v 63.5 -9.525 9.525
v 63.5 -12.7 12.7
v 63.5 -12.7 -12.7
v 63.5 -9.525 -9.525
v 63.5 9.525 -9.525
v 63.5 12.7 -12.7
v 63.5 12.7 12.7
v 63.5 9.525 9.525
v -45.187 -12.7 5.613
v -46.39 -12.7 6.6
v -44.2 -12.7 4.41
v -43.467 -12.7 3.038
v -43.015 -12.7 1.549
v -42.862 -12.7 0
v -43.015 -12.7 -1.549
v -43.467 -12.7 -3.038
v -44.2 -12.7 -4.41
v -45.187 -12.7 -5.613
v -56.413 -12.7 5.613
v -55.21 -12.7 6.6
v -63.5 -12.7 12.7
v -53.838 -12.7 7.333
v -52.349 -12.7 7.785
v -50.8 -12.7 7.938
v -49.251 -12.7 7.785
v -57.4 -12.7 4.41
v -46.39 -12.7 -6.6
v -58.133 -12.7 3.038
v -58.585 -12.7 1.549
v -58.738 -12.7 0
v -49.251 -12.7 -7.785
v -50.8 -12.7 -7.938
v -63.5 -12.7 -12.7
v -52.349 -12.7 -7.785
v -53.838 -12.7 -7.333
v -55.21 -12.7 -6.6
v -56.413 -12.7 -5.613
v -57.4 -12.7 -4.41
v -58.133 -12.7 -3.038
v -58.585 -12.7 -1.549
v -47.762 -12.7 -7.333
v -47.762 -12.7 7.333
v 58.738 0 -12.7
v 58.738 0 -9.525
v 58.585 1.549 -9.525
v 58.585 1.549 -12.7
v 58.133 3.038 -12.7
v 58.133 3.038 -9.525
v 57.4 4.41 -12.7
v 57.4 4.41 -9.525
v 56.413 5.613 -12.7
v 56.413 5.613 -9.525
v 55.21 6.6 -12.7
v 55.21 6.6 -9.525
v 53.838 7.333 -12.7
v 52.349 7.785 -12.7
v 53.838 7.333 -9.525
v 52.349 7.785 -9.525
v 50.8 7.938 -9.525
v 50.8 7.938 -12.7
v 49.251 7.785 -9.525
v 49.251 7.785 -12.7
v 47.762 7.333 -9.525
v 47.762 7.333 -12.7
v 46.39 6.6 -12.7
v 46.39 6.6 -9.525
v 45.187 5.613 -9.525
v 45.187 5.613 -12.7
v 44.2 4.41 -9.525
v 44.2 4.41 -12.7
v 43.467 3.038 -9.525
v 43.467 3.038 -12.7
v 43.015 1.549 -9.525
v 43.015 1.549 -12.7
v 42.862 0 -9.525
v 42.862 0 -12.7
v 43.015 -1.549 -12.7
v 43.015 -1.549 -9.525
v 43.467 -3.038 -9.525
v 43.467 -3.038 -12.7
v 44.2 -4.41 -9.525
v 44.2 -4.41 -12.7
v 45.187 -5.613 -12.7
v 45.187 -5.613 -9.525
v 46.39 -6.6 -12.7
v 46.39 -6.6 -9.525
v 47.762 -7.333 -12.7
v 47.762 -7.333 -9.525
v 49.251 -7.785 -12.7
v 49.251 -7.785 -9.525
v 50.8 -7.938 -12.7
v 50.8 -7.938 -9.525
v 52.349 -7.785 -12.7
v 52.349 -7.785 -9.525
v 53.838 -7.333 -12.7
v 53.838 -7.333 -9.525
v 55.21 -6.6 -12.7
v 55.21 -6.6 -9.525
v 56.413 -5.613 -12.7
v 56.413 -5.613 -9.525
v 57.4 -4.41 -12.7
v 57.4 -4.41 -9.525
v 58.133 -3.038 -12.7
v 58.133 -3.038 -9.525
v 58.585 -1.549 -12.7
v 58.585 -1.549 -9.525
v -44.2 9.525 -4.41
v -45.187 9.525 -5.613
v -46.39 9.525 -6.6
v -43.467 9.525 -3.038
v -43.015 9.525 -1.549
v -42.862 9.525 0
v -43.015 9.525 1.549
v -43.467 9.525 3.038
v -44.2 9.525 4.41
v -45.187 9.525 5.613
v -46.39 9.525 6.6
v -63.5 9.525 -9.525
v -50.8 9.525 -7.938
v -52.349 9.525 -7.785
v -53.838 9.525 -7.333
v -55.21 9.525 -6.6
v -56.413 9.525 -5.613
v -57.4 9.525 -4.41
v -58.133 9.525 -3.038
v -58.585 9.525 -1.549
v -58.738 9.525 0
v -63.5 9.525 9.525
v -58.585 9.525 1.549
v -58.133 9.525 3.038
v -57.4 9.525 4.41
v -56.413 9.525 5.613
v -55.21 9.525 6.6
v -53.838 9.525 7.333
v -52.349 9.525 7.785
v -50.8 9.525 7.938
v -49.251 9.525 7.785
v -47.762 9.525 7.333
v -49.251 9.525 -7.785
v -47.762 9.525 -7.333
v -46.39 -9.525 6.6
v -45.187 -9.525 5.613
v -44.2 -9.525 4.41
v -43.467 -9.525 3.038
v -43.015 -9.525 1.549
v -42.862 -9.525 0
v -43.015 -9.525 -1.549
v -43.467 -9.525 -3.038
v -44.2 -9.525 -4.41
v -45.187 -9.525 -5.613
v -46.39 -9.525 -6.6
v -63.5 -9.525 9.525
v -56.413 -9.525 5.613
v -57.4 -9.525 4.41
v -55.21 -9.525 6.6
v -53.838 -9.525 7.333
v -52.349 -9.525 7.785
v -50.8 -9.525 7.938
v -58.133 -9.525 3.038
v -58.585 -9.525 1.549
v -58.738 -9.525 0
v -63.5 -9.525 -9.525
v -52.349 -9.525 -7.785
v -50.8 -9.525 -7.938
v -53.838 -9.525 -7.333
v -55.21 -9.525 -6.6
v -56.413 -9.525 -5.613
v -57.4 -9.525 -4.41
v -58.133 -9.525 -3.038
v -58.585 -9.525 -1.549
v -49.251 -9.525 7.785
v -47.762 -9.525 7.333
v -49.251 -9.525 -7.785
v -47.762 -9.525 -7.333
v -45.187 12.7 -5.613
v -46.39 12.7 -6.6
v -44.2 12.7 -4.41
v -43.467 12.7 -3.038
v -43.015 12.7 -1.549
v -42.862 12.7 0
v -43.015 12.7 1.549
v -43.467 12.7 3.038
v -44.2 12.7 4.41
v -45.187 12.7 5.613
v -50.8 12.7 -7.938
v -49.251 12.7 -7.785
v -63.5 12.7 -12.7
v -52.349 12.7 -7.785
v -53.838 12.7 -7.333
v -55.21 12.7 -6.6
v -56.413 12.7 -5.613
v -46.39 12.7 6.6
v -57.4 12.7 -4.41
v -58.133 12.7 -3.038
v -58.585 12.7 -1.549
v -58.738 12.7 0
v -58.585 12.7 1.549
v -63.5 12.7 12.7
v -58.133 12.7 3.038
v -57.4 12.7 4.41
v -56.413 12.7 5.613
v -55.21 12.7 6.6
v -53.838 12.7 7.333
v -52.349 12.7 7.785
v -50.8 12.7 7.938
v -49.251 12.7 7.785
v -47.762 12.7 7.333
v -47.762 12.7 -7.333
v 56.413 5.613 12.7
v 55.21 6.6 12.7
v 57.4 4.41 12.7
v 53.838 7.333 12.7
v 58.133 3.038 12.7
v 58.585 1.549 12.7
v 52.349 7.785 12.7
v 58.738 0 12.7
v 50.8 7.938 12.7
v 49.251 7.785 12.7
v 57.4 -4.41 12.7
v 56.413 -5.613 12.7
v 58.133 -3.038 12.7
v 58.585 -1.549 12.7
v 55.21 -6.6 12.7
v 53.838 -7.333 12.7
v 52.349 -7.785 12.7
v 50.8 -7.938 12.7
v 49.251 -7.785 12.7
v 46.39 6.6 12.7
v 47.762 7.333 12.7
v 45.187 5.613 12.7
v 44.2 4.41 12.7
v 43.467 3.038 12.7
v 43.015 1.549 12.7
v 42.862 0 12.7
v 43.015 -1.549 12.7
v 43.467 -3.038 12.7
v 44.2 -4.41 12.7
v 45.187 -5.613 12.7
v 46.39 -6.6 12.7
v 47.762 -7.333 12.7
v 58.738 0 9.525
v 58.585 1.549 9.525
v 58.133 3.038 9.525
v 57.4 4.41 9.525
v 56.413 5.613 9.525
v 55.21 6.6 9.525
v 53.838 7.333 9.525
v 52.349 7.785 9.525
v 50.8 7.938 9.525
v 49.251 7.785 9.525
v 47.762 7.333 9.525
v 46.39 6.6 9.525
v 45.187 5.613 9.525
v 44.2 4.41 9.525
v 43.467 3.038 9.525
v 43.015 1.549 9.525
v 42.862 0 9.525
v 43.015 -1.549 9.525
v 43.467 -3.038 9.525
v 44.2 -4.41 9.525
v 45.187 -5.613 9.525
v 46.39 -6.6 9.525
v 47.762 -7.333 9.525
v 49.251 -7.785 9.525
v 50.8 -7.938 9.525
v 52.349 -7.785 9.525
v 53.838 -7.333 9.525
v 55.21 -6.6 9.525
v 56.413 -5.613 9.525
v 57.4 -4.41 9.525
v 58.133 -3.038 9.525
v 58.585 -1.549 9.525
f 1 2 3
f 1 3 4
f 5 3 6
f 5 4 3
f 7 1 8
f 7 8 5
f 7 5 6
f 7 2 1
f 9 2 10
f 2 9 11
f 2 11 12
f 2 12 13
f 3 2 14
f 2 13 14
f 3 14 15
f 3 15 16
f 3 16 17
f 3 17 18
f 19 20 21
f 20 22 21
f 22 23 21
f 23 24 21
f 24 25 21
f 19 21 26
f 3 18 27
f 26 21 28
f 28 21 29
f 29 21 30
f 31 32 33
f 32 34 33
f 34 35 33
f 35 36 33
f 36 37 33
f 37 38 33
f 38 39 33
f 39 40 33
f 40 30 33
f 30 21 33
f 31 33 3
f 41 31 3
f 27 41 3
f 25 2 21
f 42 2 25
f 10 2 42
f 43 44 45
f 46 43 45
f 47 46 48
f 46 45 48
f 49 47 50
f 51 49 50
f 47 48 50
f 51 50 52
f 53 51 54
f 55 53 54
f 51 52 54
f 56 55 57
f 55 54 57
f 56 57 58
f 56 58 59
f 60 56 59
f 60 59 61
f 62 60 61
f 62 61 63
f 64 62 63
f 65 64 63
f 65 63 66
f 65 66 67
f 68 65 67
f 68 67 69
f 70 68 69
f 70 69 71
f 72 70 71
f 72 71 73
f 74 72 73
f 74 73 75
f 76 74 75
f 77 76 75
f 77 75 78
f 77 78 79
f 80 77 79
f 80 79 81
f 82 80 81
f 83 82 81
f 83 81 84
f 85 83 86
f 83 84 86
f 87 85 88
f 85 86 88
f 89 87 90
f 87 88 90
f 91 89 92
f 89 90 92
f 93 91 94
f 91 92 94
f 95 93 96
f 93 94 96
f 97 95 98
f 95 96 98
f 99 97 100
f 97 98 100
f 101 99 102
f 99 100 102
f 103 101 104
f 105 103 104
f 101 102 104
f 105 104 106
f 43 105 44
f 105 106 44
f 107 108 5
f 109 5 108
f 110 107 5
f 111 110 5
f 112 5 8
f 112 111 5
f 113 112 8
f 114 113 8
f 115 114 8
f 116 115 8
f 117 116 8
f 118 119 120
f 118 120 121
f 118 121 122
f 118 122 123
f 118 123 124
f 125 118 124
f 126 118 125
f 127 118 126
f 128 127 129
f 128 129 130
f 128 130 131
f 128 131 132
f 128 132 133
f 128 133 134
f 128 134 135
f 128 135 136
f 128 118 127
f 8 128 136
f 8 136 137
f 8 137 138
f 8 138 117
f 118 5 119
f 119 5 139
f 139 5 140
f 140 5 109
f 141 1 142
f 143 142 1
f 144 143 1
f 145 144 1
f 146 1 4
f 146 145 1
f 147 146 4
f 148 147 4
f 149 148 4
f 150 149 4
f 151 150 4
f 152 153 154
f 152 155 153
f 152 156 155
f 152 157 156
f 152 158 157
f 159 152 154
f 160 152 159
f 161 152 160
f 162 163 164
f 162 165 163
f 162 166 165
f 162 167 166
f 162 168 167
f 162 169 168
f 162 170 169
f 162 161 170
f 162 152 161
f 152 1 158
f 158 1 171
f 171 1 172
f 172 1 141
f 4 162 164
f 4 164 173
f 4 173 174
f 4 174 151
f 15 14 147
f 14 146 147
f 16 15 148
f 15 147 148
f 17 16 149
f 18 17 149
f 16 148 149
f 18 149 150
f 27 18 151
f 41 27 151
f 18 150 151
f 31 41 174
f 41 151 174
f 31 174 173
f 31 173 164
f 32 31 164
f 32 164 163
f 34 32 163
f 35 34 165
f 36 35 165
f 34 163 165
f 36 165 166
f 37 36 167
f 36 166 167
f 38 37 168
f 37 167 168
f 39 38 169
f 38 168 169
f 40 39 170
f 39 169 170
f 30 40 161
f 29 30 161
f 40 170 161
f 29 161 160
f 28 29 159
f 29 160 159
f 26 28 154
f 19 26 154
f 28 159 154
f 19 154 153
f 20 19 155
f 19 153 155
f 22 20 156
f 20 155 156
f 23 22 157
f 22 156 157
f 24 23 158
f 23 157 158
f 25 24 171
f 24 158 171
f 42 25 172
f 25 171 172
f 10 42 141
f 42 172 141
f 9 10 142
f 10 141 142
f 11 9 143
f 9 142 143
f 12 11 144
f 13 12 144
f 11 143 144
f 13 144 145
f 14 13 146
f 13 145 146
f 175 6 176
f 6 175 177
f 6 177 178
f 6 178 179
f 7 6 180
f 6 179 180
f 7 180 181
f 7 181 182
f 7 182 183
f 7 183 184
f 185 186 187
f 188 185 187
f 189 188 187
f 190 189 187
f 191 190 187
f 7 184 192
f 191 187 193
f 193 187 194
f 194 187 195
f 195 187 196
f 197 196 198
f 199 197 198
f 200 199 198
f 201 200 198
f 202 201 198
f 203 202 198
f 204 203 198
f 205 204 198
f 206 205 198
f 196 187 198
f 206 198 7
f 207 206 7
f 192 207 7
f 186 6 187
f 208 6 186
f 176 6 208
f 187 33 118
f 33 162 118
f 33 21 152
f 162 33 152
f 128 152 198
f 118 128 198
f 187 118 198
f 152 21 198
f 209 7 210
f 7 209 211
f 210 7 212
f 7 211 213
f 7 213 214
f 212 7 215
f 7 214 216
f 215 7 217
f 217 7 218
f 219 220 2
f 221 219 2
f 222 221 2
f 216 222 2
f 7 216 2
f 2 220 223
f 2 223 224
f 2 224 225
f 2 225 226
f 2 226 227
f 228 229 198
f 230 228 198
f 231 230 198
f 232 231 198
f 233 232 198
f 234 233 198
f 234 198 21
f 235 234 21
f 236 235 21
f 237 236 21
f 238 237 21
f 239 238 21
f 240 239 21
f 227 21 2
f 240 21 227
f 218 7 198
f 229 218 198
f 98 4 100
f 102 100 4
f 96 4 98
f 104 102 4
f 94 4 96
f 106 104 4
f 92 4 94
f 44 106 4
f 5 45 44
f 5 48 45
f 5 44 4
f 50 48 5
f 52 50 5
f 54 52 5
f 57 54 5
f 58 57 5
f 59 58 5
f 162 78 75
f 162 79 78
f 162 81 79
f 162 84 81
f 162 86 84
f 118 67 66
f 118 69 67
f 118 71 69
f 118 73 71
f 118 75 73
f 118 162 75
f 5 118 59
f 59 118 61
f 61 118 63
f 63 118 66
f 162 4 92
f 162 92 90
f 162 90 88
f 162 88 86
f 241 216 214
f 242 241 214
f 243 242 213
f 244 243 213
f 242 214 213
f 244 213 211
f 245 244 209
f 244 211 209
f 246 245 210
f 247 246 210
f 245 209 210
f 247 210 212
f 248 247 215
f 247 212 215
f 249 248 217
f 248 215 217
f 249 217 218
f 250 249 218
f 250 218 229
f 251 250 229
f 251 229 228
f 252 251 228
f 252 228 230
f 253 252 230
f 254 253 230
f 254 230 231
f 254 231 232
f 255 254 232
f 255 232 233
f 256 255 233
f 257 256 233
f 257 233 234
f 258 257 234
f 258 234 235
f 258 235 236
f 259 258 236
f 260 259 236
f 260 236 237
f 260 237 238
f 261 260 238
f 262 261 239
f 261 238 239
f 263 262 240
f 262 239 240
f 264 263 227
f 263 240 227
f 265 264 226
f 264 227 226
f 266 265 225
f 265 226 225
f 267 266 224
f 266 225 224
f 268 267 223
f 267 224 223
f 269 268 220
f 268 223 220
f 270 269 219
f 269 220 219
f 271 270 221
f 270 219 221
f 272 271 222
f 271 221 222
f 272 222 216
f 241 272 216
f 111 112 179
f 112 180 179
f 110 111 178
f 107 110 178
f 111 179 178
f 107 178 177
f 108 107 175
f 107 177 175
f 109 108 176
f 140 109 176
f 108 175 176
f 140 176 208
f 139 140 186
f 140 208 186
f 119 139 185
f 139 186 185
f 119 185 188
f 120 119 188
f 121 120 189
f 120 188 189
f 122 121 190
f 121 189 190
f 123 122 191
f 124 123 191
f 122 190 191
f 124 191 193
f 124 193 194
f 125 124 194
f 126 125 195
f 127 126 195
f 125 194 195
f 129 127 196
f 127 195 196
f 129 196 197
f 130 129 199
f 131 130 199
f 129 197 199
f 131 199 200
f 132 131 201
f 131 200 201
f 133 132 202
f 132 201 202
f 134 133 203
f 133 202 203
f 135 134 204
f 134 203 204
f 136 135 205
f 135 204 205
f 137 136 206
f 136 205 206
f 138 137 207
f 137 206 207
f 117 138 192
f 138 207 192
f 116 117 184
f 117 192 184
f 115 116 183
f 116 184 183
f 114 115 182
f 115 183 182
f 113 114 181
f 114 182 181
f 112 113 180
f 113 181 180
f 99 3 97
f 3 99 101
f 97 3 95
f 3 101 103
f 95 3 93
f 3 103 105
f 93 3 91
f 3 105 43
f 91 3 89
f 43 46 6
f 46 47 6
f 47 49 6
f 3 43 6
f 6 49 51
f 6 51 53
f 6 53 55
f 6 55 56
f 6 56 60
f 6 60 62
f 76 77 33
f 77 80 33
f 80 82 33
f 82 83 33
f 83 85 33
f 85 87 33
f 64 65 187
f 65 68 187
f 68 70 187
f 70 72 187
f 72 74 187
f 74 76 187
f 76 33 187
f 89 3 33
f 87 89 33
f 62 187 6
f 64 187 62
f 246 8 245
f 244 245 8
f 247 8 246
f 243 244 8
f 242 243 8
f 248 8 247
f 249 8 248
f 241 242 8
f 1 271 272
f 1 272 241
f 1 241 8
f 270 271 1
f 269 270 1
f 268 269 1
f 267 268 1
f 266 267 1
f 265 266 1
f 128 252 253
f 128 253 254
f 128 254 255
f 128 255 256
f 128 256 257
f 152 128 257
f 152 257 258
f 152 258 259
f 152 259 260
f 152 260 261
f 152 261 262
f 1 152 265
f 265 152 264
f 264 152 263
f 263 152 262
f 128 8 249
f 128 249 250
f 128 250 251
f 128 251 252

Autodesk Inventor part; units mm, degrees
ref_plane "YZ Plane" through (0, 0, 0) normal (1, 0, 0) x (0, 1, 0)
ref_plane "XZ Plane" through (0, 0, 0) normal (0, 1, 0) x (-1, 0, 0)
ref_plane "XY Plane" through (0, 0, 0) normal (0, 0, 1) x (1, 0, 0)
sketch "Sketch1" plane through (0, 0, 0) normal (1, 0, 0) x (0, 1, 0)
  line L0 (-17.78, 0) -> (17.78, 0) construction
  line L1 (0, -17.78) -> (0, 17.78) construction
  line L2 (9.525, 9.525) -> (-9.525, 9.525)
  line L3 (-9.525, 9.525) -> (-9.525, -9.525)
  line L4 (-9.525, -9.525) -> (9.525, -9.525)
  line L5 (9.525, -9.525) -> (9.525, 9.525)
  line L6 (12.7, 12.7) -> (-12.7, 12.7)
  line L7 (-12.7, 12.7) -> (-12.7, -12.7)
  line L8 (-12.7, -12.7) -> (12.7, -12.7)
  line L9 (12.7, -12.7) -> (12.7, 12.7)
  point P0 (0, 0)
  point P1 (0, 12.7)
  point P2 (0, 9.525)
  point P3 (12.7, 0)
  point P4 (9.525, 0)
  dimension "d0" = 3.175
  dimension "d1" = 25.4
extrude "Extrusion1" add sketch "Sketch1" along normal mid plane 127
sketch "Sketch2" plane through (-63.5, -12.7, 12.7) normal (0, 0, 1) x (1, 0, 0)
  line L0 (63.5, -5.08) -> (63.5, 30.48) construction
  line L1 (-29.5275, 12.7) -> (177.165, 12.7) construction
  circle A0 centre (114.3, 12.7) radius 7.9375
  line L2 (127, 25.4) -> (127, 0) construction
  point P0 (63.5, 12.7)
  dimension "d4" = 15.875
  dimension "d5" = 12.7
extrude "Extrusion2" cut sketch "Sketch2" against normal through all
sketch "Sketch3" plane through (-63.5, 12.7, 12.7) normal (0, 1, 0) x (1, 0, 0)
  line L0 (63.5, 30.48) -> (63.5, -5.08) construction
  line L1 (-25.4, 12.7) -> (152.4, 12.7) construction
  circle A0 centre (12.7, 12.7) radius 7.9375
  line L2 (0, 0) -> (0, 25.4) construction
  point P0 (63.5, 12.7)
  dimension "d8" = 12.7
  dimension "d9" = 15.875
extrude "Extrusion3" cut sketch "Sketch3" against normal through all
properties part number "Coupler" material "Aluminum 6061"
